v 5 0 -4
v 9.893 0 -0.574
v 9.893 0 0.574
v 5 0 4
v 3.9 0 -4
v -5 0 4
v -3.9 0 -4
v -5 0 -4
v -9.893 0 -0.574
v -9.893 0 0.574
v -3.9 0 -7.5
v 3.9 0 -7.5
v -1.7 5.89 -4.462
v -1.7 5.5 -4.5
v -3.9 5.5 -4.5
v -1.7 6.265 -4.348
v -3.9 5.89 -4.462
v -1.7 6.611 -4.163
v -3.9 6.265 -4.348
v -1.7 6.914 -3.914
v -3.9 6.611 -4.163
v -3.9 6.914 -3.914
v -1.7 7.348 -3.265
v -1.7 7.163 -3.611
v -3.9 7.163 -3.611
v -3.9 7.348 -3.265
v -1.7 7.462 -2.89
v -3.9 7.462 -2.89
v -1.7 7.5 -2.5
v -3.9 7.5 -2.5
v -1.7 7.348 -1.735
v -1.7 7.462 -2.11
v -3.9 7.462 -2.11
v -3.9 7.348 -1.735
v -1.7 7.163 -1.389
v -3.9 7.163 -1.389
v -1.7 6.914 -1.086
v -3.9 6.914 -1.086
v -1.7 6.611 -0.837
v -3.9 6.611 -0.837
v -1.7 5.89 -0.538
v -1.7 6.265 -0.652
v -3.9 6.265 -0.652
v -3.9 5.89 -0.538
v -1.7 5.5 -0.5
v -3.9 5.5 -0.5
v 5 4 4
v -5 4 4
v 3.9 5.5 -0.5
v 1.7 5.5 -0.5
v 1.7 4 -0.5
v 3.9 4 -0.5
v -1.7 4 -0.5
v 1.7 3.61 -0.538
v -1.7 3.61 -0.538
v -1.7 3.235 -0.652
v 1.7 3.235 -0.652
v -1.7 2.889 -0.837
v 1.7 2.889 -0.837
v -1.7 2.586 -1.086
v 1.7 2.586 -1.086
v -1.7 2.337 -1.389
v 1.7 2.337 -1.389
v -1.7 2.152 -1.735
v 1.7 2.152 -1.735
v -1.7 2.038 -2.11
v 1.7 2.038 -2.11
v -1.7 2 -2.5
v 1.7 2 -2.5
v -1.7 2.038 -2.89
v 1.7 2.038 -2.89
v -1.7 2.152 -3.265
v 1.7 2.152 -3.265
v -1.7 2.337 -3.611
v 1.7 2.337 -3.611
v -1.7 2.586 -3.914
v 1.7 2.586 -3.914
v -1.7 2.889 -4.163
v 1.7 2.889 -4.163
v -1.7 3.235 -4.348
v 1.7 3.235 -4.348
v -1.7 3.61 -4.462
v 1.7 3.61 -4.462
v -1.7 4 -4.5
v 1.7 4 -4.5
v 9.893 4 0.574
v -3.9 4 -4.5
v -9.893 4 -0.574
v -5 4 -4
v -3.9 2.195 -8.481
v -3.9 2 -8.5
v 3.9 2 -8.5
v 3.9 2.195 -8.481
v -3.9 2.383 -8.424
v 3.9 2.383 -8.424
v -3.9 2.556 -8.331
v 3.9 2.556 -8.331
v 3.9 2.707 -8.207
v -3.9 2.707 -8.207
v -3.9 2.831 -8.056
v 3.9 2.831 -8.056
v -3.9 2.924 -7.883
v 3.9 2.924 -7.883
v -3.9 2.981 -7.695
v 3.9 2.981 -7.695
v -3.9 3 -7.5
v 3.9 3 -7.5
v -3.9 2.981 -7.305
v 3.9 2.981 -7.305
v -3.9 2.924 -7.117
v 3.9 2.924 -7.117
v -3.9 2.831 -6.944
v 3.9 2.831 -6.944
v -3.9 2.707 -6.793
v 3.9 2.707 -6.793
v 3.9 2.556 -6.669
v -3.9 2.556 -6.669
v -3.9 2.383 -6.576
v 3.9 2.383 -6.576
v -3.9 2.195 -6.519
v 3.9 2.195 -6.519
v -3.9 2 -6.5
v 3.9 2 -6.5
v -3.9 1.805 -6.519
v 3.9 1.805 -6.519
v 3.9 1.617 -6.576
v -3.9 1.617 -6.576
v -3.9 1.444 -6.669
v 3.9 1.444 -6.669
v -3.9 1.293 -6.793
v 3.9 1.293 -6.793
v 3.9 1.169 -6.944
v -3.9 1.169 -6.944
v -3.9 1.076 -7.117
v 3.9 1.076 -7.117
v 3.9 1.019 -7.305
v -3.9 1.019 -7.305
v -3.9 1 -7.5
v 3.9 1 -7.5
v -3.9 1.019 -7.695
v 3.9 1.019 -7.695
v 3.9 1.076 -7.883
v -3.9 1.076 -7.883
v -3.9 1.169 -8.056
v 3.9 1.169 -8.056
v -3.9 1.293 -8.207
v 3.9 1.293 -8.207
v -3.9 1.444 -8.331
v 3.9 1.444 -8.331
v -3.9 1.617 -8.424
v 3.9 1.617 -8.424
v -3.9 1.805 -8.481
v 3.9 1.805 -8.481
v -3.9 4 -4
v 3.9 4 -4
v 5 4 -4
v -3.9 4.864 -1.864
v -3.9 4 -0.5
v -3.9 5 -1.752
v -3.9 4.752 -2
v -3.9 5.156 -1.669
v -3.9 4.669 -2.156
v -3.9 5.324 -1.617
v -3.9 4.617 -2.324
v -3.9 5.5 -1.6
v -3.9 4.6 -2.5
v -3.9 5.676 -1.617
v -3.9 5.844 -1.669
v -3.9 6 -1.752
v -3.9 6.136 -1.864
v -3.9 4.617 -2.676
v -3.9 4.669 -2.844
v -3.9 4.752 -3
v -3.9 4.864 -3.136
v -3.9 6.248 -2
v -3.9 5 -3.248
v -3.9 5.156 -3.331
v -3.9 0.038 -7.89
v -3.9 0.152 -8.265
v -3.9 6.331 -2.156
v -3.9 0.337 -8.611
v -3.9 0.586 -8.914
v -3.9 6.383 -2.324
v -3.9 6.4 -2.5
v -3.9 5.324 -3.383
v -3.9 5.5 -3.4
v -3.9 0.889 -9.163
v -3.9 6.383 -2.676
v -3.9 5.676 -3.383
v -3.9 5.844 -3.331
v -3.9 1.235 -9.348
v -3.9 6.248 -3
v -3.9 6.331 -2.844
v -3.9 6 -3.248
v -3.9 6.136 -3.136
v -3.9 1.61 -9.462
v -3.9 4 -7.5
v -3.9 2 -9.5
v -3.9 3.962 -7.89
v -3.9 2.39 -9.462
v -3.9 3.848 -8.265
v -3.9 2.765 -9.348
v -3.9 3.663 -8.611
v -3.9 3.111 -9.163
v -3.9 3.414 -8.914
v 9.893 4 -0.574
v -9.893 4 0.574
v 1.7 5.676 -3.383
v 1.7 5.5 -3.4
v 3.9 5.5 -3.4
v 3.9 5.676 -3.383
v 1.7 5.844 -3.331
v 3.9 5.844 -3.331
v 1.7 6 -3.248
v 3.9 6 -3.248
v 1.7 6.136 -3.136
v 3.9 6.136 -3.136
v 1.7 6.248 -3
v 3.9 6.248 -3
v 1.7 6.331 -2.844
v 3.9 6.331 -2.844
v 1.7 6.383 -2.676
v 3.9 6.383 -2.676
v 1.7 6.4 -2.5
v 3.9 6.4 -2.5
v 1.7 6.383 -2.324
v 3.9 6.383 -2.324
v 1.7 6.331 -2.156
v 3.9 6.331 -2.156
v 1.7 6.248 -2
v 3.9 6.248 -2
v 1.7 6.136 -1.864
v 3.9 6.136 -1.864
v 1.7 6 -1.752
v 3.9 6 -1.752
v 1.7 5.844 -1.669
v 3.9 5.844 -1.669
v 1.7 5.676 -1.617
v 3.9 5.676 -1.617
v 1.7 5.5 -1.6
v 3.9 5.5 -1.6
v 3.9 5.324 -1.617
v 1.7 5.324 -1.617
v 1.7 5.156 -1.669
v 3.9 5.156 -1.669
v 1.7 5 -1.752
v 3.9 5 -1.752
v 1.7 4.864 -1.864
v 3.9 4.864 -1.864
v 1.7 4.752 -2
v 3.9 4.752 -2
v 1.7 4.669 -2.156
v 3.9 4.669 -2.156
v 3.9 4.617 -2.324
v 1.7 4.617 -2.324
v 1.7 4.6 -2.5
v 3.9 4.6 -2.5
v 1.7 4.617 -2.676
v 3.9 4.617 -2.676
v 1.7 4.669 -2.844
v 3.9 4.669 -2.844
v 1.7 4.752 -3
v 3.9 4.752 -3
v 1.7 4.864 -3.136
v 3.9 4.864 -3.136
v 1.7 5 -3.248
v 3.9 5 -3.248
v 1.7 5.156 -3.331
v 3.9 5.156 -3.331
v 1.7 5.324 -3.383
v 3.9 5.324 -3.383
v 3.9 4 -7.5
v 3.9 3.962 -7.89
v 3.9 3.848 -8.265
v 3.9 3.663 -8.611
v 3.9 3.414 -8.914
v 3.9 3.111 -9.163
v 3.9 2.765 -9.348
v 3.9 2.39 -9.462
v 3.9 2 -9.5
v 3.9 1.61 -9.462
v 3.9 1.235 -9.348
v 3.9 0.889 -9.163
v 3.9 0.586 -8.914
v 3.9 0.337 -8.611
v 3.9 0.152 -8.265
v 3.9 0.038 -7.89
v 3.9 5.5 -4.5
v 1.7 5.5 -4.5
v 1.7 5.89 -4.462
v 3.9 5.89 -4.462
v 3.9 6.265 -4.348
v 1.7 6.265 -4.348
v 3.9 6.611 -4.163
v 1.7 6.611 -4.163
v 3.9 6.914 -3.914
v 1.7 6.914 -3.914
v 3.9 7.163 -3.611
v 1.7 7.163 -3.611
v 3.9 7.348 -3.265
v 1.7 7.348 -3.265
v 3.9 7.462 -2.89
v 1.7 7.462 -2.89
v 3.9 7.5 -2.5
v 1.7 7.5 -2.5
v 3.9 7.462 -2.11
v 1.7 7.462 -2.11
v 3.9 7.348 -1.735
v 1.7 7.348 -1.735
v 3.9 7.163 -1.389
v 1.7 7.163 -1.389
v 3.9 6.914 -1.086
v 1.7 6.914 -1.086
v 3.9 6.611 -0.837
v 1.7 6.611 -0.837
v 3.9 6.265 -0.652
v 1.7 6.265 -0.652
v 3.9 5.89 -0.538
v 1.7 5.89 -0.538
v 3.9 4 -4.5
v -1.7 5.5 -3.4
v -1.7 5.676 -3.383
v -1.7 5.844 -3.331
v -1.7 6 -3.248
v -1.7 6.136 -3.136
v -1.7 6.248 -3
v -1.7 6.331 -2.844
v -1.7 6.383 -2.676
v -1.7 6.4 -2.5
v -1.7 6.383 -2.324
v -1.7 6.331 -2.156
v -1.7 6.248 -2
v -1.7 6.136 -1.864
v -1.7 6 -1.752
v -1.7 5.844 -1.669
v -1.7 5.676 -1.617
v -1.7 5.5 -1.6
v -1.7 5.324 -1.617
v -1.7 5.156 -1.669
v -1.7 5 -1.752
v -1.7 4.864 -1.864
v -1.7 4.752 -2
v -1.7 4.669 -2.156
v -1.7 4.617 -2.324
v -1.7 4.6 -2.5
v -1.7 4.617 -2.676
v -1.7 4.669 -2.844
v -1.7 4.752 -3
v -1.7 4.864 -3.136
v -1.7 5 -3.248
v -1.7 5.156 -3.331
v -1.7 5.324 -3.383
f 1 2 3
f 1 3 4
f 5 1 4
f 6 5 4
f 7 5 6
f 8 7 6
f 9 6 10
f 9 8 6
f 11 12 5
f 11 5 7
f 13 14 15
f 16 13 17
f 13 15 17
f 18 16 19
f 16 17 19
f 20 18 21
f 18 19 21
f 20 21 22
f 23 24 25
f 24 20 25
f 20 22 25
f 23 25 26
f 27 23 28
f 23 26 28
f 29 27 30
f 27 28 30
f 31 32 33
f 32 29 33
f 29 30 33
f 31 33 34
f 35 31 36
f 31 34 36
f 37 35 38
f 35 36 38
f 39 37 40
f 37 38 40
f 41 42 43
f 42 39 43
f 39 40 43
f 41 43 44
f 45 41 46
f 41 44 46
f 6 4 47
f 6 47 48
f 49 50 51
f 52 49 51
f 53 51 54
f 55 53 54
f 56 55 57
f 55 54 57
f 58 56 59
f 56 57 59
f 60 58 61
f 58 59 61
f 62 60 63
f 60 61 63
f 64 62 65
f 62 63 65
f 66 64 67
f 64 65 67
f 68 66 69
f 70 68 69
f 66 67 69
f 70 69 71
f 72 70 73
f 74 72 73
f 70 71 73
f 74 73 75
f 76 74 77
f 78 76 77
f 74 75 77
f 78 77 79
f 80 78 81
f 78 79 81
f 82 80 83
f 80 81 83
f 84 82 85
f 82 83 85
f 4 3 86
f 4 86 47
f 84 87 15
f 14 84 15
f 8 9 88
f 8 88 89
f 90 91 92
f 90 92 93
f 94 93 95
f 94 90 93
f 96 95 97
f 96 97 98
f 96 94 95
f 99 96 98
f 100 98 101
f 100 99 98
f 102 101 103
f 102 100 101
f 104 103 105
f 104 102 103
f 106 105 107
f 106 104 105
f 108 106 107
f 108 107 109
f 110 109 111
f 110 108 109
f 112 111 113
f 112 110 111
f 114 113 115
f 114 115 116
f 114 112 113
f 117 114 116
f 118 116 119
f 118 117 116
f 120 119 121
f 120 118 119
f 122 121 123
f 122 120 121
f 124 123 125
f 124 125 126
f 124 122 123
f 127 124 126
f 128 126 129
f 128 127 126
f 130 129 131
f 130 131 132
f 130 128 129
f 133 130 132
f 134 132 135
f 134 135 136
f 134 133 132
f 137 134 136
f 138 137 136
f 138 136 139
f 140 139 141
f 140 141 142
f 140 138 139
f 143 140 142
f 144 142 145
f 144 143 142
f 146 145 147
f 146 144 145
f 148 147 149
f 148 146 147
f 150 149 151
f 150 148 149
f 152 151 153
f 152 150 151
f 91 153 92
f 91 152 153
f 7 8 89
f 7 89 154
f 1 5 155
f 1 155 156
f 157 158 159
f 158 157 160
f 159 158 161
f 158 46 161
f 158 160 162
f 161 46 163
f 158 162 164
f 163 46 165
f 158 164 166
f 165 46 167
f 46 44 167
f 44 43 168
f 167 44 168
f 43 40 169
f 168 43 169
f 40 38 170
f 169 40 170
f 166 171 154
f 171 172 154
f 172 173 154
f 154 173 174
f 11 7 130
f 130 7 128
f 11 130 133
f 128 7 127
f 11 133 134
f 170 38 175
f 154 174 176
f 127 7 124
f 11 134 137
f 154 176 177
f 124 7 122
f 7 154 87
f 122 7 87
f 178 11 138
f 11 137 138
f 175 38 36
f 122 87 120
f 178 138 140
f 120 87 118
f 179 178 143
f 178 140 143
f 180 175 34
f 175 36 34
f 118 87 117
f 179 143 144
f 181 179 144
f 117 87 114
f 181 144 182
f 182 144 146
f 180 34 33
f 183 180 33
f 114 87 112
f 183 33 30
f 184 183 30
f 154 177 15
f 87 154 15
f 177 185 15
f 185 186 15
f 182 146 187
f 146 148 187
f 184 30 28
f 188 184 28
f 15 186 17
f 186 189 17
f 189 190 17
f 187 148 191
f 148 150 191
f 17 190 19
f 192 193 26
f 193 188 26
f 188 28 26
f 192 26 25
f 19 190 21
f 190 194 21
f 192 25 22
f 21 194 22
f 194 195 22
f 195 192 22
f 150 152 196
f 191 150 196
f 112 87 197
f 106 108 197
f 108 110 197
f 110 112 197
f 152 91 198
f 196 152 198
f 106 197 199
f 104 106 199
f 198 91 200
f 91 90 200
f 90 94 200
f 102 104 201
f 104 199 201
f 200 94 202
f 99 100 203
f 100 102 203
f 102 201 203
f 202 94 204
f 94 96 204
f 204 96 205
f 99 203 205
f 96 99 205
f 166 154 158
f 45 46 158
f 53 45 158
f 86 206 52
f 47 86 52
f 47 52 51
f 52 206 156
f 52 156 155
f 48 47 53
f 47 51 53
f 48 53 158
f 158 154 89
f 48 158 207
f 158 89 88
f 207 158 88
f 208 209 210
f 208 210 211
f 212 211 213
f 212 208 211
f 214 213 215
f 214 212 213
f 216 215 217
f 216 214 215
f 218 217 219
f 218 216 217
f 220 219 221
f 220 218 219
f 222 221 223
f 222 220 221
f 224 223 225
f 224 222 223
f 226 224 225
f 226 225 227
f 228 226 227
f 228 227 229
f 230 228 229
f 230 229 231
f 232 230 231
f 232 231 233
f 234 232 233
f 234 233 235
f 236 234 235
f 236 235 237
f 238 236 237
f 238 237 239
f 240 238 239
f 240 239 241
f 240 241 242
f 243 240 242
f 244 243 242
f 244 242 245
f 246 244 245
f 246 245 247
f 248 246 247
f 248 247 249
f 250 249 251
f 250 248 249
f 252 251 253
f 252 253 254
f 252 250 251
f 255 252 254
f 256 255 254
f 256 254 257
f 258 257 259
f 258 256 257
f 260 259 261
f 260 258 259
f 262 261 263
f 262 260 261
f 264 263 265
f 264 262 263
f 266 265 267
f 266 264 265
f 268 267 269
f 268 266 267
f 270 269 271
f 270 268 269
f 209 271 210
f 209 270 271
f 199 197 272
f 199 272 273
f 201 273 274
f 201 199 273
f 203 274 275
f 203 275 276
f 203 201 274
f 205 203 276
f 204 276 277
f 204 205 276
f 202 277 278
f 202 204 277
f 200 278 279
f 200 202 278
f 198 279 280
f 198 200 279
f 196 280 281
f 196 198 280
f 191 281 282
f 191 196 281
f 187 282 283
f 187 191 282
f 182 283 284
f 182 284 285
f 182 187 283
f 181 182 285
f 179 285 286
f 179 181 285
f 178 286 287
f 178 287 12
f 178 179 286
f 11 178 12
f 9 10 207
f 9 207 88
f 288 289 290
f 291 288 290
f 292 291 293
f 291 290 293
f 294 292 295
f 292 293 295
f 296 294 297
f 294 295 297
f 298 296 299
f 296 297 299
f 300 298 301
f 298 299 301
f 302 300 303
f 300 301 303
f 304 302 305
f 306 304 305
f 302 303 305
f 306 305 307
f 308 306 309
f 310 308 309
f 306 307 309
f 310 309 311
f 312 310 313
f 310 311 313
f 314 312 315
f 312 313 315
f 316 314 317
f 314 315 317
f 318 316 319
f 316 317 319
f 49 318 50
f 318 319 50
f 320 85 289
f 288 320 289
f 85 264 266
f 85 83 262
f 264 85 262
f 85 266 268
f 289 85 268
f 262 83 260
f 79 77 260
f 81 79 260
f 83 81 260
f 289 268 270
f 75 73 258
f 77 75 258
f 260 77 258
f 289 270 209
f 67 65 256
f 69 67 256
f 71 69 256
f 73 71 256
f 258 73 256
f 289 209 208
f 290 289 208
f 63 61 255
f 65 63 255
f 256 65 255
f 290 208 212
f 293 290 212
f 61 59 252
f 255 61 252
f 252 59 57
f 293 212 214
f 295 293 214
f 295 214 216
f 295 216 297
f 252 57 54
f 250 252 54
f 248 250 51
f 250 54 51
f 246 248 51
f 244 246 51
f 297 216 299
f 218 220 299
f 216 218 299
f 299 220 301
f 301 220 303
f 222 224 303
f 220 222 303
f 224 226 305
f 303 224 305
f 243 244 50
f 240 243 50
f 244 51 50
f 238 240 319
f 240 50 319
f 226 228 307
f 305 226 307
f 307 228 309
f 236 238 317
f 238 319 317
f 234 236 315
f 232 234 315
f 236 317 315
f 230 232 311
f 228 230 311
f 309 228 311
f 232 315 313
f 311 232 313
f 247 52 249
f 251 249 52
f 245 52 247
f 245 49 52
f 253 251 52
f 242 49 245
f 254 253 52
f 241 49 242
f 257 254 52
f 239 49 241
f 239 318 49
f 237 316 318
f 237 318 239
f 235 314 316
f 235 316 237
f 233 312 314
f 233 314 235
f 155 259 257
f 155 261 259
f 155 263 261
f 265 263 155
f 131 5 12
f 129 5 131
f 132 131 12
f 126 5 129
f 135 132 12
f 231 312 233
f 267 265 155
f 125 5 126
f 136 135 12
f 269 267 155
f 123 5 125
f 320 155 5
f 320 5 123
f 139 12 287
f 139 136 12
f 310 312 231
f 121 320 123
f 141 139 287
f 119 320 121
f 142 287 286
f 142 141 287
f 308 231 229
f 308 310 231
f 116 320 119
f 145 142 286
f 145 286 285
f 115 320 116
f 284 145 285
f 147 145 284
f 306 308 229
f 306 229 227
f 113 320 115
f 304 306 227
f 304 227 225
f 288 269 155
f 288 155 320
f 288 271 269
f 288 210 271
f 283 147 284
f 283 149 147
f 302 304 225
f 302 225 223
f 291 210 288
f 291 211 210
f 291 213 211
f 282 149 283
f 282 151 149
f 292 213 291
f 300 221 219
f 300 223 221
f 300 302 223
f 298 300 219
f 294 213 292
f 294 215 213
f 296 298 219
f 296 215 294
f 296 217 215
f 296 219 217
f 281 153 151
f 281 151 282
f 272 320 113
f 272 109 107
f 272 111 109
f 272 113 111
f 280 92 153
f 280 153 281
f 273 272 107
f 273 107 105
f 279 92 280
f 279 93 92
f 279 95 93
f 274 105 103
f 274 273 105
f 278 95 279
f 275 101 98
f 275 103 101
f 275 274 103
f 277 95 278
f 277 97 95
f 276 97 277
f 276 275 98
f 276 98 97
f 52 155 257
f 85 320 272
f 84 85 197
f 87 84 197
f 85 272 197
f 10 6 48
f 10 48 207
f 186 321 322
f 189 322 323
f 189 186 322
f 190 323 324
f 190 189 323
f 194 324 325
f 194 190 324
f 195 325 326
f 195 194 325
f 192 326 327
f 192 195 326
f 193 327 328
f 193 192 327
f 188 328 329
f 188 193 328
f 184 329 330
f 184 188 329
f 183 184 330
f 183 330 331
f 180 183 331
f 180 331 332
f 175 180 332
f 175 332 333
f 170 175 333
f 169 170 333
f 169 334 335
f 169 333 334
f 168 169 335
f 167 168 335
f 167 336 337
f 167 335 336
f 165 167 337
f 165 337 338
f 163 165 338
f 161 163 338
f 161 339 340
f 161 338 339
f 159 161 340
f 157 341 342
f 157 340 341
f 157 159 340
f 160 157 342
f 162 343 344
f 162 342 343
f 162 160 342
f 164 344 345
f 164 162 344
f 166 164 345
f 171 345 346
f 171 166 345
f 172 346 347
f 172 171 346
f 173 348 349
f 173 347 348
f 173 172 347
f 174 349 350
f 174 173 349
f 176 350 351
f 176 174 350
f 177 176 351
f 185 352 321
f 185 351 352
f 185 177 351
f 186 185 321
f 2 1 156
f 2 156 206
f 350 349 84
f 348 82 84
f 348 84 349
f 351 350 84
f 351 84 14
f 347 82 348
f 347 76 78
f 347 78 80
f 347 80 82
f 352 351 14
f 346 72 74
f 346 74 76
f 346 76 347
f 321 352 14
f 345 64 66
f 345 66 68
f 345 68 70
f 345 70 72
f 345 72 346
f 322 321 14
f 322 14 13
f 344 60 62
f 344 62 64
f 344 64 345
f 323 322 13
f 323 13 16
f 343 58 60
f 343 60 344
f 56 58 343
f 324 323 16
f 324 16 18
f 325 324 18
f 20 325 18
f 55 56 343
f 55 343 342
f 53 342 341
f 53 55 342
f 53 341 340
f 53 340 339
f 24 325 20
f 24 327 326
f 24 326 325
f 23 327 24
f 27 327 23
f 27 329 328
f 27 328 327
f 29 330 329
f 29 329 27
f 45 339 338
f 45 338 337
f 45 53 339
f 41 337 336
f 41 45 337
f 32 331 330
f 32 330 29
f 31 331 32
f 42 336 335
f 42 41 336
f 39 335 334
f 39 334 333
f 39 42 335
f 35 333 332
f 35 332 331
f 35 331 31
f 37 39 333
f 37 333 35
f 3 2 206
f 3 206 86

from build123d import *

# Parameters (mm, degrees)
BOSS_EXTRUDE1_DEPTH      = 4
BOSS_EXTRUDE2_DEPTH      = 3.9
BOSS_EXTRUDE2_DEPTH_BACK = 3.9
SKETCH2_R                = 1
BOSS_EXTRUDE3_DEPTH      = 3.9
BOSS_EXTRUDE3_DEPTH_BACK = 3.9
SKETCH4_R                = 0.9
CUT_EXTRUDE1_REACH       = 20.341
SKETCH5_W                = 3.4
SKETCH5_H                = 3.5
CUT_EXTRUDE2_DEPTH       = 3.4


with BuildPart() as part:
    # Sketch1 → Boss-Extrude1 (new body)
    with BuildSketch(Plane(origin=(0, 0, 0), x_dir=(1, 0, 0), z_dir=(0, 1, 0))):
        Polygon((-5, 4), (5, 4), (9.893439983, 0.573576436), (9.893439983, -0.573576436), (5, -4), (-5, -4), (-9.893439983, -0.573576436), (-9.893439983, 0.573576436), align=None)
    extrude(amount=BOSS_EXTRUDE1_DEPTH)

    # Sketch2 → Boss-Extrude2 (add, two sides: drawn at the far end of the back side and taken through both)
    with BuildSketch(Plane(origin=(0, 0, 0), x_dir=(0, 0, -1), z_dir=(1, 0, 0)).offset(-BOSS_EXTRUDE2_DEPTH_BACK)):
        with BuildLine():
            Line((4, 4), (7.5, 4))
            ThreePointArc((7.5, 4), (9.5, 2), (7.5, 0))
            Line((7.5, 0), (4, 0))
            Line((4, 0), (4, 4))
        make_face()
        with Locations((7.5, 2)):
            Circle(SKETCH2_R, mode=Mode.SUBTRACT)
    extrude(amount=BOSS_EXTRUDE2_DEPTH + BOSS_EXTRUDE2_DEPTH_BACK)

    # Sketch4 → Boss-Extrude3 (add, two sides: drawn at the far end of the back side and taken through both)
    with BuildSketch(Plane(origin=(0, 0, 0), x_dir=(0, 0, -1), z_dir=(1, 0, 0)).offset(-BOSS_EXTRUDE3_DEPTH_BACK)):
        with BuildLine():
            Line((0.5, 4), (4.5, 4))
            Line((4.5, 4), (4.5, 5.5))
            ThreePointArc((4.5, 5.5), (2.5, 7.5), (0.5, 5.5))
            Line((0.5, 5.5), (0.5, 4))
        make_face()
        with Locations((2.5, 5.5)):
            Circle(SKETCH4_R, mode=Mode.SUBTRACT)
    extrude(amount=BOSS_EXTRUDE3_DEPTH + BOSS_EXTRUDE3_DEPTH_BACK)

    # Sketch5 → Cut-Extrude1 (cut, up to next)
    with BuildSketch(Plane.XY.offset(4), mode=Mode.PRIVATE) as cut_extrude1_sk1:
        with Locations((0, 5.75)):
            Rectangle(SKETCH5_W, SKETCH5_H)
    cut_extrude1_tool1 = extrude(cut_extrude1_sk1.sketch, amount=-CUT_EXTRUDE1_REACH, mode=Mode.PRIVATE) & part.part
    add(cut_extrude1_tool1.solids().sort_by_distance((0, 5.75, 4))[0], mode=Mode.SUBTRACT)

    # Sketch6 → Cut-Extrude2 (cut)
    with BuildSketch(Plane.ZY.offset(-1.7)):
        with BuildLine():
            Line((-4.5, 4), (-0.5, 4))
            ThreePointArc((-0.5, 4), (-2.5, 2), (-4.5, 4))
        make_face()
    extrude(amount=CUT_EXTRUDE2_DEPTH, mode=Mode.SUBTRACT)


solid = part.part
